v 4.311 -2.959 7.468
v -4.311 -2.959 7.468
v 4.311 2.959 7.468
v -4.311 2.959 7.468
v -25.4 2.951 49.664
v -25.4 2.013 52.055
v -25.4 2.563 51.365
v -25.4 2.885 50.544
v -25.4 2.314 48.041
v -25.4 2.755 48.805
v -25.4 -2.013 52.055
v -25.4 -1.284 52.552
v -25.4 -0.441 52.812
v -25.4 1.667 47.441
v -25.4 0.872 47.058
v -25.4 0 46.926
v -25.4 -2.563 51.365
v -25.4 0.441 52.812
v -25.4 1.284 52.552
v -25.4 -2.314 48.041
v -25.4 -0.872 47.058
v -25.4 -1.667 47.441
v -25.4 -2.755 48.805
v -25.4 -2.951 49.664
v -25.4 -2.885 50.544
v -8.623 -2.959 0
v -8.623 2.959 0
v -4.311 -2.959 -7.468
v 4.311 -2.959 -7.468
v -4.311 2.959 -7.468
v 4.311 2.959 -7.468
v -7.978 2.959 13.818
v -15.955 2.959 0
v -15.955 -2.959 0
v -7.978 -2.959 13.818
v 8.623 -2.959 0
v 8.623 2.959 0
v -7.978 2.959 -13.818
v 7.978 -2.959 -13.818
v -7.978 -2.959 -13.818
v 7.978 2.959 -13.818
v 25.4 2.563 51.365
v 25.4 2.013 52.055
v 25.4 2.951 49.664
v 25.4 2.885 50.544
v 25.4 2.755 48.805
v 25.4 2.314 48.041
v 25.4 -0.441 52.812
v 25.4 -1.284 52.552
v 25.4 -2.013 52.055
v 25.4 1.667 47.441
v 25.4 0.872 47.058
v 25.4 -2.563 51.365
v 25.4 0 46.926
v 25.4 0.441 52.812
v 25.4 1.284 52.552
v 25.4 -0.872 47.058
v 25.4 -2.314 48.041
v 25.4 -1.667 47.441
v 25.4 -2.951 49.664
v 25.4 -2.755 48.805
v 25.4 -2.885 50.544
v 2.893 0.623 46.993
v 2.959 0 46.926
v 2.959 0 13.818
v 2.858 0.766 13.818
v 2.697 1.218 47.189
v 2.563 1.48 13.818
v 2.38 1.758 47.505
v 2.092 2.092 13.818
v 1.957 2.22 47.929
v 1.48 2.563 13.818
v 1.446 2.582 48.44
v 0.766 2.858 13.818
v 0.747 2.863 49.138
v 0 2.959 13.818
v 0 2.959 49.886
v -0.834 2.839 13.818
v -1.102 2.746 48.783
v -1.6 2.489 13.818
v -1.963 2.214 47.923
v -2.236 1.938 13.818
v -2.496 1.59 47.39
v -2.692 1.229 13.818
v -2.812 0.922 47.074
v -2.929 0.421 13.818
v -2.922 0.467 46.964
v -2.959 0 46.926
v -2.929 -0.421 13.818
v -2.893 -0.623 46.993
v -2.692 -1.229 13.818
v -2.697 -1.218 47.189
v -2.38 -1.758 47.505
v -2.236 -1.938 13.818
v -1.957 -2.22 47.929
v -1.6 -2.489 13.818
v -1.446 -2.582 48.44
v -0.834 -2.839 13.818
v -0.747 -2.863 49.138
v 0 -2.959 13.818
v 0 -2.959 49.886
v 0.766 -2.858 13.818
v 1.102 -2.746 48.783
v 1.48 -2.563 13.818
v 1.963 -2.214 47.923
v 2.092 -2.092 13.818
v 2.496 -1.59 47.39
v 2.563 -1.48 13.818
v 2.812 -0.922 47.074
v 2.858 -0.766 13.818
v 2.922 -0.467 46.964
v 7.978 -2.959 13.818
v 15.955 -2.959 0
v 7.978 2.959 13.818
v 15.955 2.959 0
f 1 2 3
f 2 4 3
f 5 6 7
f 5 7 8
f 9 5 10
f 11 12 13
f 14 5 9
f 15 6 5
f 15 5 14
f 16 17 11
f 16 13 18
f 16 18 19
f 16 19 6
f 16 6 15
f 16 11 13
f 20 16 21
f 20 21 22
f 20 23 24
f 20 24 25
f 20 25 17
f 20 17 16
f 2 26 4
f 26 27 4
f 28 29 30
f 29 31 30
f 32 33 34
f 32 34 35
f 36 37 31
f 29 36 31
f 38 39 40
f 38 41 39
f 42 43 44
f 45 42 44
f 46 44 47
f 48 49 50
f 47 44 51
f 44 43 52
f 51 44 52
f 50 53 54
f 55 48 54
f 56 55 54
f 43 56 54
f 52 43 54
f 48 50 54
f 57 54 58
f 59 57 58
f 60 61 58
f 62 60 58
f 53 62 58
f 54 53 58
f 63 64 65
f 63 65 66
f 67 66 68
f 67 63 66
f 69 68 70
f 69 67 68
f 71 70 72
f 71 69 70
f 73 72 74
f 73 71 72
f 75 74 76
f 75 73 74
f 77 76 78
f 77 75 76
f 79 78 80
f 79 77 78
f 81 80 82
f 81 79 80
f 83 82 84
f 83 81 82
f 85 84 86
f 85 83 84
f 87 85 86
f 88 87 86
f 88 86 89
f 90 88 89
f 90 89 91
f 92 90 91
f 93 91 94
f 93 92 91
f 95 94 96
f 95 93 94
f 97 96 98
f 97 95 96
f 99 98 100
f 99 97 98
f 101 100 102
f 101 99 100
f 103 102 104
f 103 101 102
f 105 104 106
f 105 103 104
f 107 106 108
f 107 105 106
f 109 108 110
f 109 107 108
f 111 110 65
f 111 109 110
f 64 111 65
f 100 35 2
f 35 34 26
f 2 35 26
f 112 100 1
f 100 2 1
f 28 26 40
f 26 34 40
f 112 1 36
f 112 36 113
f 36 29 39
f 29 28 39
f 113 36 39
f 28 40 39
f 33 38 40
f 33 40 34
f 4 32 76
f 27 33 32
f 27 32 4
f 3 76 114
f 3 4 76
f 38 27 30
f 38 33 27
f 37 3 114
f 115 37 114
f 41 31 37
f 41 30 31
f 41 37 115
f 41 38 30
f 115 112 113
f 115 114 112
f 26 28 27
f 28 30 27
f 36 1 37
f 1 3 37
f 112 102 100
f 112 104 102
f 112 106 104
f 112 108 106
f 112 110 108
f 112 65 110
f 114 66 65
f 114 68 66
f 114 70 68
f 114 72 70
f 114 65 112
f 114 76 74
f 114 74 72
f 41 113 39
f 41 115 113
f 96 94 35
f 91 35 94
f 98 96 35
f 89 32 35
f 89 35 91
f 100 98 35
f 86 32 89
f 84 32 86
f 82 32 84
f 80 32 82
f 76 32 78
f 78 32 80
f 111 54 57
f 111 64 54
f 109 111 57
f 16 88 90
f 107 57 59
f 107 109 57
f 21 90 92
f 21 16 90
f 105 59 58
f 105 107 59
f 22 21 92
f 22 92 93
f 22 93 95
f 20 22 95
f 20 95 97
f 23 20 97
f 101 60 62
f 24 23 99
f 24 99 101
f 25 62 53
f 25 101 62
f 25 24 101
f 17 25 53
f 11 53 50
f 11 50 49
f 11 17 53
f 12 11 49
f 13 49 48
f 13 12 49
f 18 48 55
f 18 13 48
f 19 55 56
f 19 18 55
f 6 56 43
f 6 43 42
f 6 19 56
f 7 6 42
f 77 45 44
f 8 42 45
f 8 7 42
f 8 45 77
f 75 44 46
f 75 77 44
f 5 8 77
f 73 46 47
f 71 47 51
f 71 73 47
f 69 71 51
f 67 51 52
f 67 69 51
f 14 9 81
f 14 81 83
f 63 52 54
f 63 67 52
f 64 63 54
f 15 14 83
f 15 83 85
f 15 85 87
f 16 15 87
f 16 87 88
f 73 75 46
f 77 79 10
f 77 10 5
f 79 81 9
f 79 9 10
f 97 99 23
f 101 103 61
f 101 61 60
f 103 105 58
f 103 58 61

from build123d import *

# Parameters (mm, degrees)
BOSS_EXTRUDE1_DEPTH = 2.9591
SWEEP1_PROFILE_R    = 2.9591
SWEEP2_PROFILE_R    = 2.9591


with BuildPart() as part:
    # Sketch1 → Boss-Extrude1 (new, symmetric)
    with BuildSketch(Plane(origin=(0, 0, 0), x_dir=(1, 0, 0), z_dir=(0, 1, 0))):
        Polygon((7.97759508, 13.8176), (-7.97759508, 13.8176), (-15.955190159, 0), (-7.97759508, -13.8176), (7.97759508, -13.8176), (15.955190159, 0), align=None)
        Polygon((8.62284174, 0), (4.31142087, 7.4676), (-4.31142087, 7.4676), (-8.62284174, 0), (-4.31142087, -7.4676), (4.31142087, -7.4676), align=None, mode=Mode.SUBTRACT)
    extrude(amount=BOSS_EXTRUDE1_DEPTH, both=True)

    # Sweep1: sweep along a path in Sketch6
    with BuildLine(Plane(origin=(0, 0, 0), x_dir=(1, 0, 0), z_dir=(0, 1, 0))) as sweep1_path:
        Line((0, -13.8176), (0, -49.8856))
    # Sweep1 profile (on start of the path) → Sweep1 (sweep)
    with BuildSketch(Plane.XY.offset(13.8176)):
        Circle(SWEEP1_PROFILE_R)
    sweep(path=sweep1_path.line)

    # Sweep2: sweep along a path in Sketch6<4>
    with BuildLine(Plane(origin=(0, 0, 0), x_dir=(1, 0, 0), z_dir=(0, 1, 0))) as sweep2_path:
        Line((25.4, -49.8856), (-25.4, -49.8856))
    # Sweep2 profile (on start of the path) → Sweep2 (sweep)
    with BuildSketch(Plane(origin=(25.4, 0, 49.8856), x_dir=(0, 0, -1), z_dir=(-1, 0, 0))):
        Circle(SWEEP2_PROFILE_R)
    sweep(path=sweep2_path.line)


solid = part.part
